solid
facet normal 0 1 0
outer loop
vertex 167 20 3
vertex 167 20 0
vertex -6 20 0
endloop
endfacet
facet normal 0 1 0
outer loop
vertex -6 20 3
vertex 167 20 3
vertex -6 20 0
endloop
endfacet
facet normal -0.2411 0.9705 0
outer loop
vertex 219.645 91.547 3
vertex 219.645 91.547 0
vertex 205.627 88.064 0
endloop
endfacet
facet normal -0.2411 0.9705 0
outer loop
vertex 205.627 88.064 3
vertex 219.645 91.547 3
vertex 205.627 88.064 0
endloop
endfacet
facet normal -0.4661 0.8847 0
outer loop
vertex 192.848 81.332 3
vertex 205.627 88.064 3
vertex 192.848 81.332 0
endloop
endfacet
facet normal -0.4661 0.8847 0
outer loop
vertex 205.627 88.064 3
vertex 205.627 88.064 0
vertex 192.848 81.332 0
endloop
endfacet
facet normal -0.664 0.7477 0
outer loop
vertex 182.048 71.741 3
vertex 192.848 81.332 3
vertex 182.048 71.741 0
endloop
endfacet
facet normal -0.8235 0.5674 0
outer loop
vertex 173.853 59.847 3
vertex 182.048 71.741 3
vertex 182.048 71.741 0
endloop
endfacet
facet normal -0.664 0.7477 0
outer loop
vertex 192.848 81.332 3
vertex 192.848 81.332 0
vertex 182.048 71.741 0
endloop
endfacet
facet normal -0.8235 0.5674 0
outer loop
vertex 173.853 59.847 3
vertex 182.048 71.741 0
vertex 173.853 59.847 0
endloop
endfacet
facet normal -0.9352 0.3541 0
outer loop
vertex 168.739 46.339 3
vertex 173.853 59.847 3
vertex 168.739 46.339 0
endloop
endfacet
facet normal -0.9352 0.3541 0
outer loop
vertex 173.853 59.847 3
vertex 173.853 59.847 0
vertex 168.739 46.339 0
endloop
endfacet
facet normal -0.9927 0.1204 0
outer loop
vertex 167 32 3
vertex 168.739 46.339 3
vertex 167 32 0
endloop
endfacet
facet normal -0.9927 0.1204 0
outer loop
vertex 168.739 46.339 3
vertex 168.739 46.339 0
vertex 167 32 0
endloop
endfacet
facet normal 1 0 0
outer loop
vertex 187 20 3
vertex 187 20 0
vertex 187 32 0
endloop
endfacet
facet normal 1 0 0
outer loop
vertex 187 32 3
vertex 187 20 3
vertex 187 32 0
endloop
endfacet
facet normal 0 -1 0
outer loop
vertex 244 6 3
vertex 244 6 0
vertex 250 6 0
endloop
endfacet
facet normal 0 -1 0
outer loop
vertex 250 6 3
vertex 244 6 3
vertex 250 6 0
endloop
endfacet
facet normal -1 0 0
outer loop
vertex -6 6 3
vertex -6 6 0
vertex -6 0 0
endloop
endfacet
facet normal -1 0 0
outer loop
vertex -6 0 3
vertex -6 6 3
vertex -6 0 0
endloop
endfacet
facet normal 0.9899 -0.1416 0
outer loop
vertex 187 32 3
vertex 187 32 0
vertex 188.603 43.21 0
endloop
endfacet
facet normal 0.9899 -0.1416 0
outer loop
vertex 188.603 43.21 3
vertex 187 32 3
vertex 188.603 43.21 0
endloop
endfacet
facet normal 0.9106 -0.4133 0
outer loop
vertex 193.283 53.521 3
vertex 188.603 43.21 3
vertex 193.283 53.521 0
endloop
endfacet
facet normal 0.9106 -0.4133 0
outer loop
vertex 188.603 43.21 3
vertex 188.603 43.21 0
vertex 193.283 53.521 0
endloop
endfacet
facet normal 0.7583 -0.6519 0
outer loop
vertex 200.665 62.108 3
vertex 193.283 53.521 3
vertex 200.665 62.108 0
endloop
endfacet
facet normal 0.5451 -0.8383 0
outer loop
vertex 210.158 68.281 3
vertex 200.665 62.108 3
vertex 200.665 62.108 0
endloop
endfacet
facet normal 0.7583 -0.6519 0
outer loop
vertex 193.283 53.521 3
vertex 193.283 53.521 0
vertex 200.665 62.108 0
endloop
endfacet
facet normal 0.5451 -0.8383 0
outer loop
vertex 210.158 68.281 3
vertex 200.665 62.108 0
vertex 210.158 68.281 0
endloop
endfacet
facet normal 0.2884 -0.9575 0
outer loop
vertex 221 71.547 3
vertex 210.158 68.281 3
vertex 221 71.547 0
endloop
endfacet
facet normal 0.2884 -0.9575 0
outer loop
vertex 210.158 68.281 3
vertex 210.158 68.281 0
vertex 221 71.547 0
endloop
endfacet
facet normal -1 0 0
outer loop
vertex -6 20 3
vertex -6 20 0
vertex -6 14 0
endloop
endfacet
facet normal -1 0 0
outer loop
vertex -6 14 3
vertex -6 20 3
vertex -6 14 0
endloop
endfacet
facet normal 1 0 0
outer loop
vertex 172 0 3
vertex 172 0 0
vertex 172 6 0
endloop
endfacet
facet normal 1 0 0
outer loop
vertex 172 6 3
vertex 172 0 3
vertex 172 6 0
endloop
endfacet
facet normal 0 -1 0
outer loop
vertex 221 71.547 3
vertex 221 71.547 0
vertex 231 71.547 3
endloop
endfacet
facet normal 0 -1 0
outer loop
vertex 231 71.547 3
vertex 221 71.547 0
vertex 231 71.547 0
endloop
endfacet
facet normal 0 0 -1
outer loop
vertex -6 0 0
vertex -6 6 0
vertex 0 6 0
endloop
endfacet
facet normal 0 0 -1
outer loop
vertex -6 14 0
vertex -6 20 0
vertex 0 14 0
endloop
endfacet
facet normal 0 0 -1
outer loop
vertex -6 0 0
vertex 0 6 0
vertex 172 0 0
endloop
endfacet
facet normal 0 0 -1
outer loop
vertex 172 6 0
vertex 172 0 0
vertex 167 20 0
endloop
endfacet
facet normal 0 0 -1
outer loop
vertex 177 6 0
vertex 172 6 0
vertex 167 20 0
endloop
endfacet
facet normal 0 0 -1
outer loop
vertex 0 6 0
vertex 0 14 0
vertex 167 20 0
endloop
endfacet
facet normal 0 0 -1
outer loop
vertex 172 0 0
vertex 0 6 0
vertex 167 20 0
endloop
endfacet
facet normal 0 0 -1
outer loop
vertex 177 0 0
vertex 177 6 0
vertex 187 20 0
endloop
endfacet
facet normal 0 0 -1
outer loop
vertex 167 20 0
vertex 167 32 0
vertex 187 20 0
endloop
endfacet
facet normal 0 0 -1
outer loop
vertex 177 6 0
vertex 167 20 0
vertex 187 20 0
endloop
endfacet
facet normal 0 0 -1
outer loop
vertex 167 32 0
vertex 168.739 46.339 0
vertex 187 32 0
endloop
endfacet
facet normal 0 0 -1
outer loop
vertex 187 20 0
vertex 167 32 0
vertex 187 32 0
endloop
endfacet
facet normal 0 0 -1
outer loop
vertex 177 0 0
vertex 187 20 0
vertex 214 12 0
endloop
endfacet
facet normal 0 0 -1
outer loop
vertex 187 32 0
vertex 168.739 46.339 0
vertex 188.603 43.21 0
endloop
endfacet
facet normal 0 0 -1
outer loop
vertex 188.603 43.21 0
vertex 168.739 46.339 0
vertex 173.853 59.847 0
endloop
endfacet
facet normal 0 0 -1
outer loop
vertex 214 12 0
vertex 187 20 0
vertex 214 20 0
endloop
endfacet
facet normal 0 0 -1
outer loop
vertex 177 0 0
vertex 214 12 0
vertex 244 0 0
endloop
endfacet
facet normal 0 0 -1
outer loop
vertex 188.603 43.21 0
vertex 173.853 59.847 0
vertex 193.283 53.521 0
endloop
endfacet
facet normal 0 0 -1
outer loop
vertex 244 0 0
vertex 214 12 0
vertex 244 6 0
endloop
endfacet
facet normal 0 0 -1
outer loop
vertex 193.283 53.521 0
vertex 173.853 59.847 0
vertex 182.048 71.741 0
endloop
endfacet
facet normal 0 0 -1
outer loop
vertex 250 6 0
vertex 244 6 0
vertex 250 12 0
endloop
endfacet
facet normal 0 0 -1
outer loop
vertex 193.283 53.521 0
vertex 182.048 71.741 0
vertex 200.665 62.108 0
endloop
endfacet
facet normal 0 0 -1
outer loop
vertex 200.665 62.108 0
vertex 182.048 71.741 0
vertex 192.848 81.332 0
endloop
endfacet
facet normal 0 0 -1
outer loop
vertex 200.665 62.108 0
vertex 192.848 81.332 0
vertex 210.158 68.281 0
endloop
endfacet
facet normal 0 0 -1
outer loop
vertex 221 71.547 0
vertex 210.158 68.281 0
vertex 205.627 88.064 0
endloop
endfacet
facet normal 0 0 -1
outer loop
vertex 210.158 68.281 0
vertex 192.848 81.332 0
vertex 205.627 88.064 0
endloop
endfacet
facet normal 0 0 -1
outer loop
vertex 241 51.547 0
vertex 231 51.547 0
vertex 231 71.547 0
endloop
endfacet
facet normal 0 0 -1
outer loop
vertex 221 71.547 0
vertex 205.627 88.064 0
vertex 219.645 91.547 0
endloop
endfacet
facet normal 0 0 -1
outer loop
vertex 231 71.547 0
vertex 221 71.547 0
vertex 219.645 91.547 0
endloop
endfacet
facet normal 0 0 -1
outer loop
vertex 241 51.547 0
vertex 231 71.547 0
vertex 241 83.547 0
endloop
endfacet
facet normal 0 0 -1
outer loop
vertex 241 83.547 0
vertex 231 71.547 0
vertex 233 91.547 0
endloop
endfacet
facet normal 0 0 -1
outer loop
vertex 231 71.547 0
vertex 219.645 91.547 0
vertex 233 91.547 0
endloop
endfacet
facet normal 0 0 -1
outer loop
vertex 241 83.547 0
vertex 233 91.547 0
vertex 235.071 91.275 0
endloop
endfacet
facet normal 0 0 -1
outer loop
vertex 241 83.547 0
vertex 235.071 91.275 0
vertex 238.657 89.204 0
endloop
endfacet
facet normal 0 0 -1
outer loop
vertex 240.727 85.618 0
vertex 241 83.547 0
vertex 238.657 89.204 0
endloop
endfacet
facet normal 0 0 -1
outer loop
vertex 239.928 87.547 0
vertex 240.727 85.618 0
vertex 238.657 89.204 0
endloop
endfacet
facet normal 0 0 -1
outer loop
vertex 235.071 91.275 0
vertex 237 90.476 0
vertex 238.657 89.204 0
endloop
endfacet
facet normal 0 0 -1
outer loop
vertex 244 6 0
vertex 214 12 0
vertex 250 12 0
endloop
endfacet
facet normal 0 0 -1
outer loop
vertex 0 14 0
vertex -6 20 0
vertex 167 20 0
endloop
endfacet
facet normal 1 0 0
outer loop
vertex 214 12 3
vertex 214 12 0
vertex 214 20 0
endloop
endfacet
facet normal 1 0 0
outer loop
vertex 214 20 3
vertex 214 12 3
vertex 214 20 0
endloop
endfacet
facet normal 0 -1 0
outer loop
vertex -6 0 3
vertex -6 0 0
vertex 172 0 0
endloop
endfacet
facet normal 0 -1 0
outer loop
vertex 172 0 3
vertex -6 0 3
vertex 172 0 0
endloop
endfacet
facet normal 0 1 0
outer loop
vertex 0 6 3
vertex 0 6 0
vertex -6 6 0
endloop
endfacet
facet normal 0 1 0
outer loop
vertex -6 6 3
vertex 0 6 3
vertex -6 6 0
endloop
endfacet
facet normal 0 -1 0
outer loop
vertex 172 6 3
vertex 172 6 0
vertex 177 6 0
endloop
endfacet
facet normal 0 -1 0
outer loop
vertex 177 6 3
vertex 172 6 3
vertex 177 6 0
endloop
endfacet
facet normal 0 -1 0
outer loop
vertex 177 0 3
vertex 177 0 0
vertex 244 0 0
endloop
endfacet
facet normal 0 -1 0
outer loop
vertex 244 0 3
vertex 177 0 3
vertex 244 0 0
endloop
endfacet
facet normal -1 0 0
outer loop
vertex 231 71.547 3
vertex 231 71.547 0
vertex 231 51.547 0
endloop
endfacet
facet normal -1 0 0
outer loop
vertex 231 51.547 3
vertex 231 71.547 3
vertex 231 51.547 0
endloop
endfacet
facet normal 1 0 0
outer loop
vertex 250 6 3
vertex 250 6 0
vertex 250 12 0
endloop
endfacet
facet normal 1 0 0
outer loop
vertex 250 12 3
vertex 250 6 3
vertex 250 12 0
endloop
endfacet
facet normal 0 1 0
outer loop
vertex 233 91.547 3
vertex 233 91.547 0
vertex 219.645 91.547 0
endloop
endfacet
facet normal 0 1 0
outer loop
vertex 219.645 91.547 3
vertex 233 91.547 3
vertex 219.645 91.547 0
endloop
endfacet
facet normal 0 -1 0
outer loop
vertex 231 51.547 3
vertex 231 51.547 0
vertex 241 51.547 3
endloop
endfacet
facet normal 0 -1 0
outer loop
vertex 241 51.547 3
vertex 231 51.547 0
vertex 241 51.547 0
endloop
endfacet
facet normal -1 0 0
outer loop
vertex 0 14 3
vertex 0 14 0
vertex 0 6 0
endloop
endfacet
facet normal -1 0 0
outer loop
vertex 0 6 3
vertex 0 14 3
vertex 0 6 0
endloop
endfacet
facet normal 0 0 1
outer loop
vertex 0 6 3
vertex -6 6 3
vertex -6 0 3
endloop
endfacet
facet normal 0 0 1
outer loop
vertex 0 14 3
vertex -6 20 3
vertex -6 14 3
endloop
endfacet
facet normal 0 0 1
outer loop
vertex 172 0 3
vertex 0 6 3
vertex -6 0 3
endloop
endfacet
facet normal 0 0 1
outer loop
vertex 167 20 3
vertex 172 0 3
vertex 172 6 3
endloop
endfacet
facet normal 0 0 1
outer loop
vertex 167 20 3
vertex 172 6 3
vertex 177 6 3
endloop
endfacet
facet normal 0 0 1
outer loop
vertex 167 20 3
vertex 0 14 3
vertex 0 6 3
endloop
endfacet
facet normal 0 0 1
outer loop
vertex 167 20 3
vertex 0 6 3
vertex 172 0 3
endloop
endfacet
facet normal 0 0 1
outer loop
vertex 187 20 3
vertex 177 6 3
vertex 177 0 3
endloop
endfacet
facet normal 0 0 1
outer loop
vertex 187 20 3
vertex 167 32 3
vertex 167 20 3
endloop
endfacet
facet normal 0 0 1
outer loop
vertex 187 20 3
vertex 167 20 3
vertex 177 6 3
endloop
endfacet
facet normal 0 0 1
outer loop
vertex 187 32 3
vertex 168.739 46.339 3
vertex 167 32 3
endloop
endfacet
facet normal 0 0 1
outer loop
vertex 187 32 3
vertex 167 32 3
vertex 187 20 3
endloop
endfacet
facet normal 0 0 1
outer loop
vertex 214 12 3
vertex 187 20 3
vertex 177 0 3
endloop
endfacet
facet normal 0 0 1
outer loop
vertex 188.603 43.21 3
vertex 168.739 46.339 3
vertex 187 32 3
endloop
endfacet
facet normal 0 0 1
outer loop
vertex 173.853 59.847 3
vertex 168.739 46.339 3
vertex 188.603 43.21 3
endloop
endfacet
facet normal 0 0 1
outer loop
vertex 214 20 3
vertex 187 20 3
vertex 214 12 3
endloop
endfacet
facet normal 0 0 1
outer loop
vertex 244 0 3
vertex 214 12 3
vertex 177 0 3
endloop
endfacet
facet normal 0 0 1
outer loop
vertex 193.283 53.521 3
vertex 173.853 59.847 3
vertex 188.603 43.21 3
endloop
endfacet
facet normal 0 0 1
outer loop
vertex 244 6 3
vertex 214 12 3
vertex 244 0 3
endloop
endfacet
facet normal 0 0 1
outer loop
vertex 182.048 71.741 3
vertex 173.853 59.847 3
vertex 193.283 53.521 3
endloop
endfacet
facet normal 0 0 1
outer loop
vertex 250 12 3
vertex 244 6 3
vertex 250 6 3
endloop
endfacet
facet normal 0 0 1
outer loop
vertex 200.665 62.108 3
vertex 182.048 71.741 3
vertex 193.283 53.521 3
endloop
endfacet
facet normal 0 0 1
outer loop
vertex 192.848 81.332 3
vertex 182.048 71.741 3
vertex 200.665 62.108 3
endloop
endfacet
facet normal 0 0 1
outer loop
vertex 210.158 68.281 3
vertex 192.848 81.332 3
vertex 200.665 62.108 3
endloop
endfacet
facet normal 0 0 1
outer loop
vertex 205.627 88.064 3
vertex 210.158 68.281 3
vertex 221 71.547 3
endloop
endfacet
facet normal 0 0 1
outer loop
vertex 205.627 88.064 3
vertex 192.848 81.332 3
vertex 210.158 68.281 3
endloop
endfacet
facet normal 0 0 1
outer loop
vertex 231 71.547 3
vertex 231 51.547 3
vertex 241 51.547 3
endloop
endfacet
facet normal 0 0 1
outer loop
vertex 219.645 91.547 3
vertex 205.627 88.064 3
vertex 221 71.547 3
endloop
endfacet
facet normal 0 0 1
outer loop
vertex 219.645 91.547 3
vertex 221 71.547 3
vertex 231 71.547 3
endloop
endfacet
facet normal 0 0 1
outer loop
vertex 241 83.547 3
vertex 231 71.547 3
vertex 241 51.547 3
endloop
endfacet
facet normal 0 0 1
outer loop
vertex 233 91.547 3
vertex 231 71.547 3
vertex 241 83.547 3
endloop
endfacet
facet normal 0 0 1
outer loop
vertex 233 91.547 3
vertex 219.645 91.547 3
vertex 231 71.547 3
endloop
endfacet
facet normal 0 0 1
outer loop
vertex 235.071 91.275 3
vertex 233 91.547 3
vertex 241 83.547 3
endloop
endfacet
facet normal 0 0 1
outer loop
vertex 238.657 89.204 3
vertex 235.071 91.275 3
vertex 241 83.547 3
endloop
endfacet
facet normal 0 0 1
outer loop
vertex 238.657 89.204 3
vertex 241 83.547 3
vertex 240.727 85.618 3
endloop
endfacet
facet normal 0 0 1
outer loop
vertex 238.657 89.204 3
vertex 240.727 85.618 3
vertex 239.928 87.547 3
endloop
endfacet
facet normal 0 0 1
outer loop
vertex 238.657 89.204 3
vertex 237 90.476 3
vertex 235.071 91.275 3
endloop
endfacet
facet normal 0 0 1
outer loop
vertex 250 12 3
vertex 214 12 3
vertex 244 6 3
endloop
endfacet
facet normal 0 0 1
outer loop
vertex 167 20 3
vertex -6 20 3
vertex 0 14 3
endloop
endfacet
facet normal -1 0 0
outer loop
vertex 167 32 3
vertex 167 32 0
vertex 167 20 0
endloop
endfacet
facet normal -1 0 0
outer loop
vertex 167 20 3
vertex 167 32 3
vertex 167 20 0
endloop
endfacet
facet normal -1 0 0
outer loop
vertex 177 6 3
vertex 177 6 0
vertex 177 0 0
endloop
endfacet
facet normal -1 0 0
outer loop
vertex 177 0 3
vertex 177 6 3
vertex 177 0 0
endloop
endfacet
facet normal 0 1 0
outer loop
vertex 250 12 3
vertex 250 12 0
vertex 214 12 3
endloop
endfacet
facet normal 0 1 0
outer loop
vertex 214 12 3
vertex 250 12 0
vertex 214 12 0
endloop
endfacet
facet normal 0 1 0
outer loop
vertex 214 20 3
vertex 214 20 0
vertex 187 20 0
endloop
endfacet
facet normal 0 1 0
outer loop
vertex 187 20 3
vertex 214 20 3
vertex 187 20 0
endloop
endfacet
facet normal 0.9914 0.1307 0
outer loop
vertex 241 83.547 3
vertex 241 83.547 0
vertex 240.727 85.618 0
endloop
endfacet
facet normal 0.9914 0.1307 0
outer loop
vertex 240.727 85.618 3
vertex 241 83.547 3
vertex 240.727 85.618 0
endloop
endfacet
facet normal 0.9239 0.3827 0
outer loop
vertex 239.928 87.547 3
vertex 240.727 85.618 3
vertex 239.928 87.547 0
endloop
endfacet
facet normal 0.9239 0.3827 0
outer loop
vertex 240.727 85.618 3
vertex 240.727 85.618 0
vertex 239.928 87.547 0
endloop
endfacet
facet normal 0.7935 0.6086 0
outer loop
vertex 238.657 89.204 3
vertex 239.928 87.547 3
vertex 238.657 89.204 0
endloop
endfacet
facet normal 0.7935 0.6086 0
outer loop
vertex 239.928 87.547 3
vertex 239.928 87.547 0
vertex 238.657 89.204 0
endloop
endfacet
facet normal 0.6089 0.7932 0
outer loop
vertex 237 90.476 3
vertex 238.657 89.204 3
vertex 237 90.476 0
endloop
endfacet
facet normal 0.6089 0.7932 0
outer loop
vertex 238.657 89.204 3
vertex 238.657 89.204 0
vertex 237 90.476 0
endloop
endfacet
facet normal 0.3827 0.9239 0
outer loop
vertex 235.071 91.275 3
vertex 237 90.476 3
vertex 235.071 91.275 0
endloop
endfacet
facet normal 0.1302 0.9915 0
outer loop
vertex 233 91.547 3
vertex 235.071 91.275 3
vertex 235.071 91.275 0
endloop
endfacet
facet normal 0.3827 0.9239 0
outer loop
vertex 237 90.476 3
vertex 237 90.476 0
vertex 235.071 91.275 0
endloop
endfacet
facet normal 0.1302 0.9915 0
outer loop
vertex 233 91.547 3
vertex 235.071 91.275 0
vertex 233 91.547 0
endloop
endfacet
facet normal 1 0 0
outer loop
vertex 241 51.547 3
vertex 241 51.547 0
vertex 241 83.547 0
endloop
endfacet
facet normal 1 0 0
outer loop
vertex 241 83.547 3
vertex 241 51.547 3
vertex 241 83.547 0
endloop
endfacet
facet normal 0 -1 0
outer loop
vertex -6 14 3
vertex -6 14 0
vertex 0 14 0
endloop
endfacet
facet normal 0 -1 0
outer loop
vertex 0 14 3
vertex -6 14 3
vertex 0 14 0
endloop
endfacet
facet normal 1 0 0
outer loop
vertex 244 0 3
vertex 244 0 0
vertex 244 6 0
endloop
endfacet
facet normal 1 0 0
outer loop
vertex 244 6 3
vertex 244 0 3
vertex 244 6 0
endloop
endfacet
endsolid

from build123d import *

# Parameters (mm, degrees)
EXTRUDE_1_DEPTH = 3


with BuildPart() as part:
    # Эскиз2 → Бобышка-Вытянуть1 (new body)
    with BuildSketch(Plane.XY):
        with BuildLine():
            Line((0, 0), (172, 0))
            Line((172, 0), (172, 6))
            Line((172, 6), (177, 6))
            Line((177, 6), (177, 0))
            Line((177, 0), (244, 0))
            Line((244, 0), (244, 6))
            Line((244, 6), (250, 6))
            Line((250, 6), (250, 12))
            Line((250, 12), (244, 12))
            Line((244, 12), (214, 12))
            Line((214, 12), (214, 20))
            Line((214, 20), (187, 20))
            Line((187, 20), (187, 32))
            ThreePointArc((187, 32), (196.668498224, 58.076809621), (221, 71.547439867))
            Line((221, 71.547439867), (231, 71.547439867))
            Line((231, 71.547439867), (231, 51.547439867))
            Line((231, 51.547439867), (241, 51.547439867))
            Line((241, 51.547439867), (241, 83.547439867))
            ThreePointArc((241, 83.547439867), (238.656854249, 89.204294116), (233, 91.547439867))
            Line((233, 91.547439867), (219.644566271, 91.547439867))
            ThreePointArc((219.644566271, 91.547439867), (182.048214587, 71.740873017), (167, 32))
            Line((167, 32), (167, 20))
            Line((167, 20), (0, 20))
            Line((0, 20), (-6, 20))
            Line((-6, 20), (-6, 14))
            Line((-6, 14), (0, 14))
            Line((0, 14), (0, 6))
            Line((0, 6), (-6, 6))
            Line((-6, 6), (-6, 0))
            Line((-6, 0), (0, 0))
        make_face()
    extrude(amount=EXTRUDE_1_DEPTH)


solid = part.part
